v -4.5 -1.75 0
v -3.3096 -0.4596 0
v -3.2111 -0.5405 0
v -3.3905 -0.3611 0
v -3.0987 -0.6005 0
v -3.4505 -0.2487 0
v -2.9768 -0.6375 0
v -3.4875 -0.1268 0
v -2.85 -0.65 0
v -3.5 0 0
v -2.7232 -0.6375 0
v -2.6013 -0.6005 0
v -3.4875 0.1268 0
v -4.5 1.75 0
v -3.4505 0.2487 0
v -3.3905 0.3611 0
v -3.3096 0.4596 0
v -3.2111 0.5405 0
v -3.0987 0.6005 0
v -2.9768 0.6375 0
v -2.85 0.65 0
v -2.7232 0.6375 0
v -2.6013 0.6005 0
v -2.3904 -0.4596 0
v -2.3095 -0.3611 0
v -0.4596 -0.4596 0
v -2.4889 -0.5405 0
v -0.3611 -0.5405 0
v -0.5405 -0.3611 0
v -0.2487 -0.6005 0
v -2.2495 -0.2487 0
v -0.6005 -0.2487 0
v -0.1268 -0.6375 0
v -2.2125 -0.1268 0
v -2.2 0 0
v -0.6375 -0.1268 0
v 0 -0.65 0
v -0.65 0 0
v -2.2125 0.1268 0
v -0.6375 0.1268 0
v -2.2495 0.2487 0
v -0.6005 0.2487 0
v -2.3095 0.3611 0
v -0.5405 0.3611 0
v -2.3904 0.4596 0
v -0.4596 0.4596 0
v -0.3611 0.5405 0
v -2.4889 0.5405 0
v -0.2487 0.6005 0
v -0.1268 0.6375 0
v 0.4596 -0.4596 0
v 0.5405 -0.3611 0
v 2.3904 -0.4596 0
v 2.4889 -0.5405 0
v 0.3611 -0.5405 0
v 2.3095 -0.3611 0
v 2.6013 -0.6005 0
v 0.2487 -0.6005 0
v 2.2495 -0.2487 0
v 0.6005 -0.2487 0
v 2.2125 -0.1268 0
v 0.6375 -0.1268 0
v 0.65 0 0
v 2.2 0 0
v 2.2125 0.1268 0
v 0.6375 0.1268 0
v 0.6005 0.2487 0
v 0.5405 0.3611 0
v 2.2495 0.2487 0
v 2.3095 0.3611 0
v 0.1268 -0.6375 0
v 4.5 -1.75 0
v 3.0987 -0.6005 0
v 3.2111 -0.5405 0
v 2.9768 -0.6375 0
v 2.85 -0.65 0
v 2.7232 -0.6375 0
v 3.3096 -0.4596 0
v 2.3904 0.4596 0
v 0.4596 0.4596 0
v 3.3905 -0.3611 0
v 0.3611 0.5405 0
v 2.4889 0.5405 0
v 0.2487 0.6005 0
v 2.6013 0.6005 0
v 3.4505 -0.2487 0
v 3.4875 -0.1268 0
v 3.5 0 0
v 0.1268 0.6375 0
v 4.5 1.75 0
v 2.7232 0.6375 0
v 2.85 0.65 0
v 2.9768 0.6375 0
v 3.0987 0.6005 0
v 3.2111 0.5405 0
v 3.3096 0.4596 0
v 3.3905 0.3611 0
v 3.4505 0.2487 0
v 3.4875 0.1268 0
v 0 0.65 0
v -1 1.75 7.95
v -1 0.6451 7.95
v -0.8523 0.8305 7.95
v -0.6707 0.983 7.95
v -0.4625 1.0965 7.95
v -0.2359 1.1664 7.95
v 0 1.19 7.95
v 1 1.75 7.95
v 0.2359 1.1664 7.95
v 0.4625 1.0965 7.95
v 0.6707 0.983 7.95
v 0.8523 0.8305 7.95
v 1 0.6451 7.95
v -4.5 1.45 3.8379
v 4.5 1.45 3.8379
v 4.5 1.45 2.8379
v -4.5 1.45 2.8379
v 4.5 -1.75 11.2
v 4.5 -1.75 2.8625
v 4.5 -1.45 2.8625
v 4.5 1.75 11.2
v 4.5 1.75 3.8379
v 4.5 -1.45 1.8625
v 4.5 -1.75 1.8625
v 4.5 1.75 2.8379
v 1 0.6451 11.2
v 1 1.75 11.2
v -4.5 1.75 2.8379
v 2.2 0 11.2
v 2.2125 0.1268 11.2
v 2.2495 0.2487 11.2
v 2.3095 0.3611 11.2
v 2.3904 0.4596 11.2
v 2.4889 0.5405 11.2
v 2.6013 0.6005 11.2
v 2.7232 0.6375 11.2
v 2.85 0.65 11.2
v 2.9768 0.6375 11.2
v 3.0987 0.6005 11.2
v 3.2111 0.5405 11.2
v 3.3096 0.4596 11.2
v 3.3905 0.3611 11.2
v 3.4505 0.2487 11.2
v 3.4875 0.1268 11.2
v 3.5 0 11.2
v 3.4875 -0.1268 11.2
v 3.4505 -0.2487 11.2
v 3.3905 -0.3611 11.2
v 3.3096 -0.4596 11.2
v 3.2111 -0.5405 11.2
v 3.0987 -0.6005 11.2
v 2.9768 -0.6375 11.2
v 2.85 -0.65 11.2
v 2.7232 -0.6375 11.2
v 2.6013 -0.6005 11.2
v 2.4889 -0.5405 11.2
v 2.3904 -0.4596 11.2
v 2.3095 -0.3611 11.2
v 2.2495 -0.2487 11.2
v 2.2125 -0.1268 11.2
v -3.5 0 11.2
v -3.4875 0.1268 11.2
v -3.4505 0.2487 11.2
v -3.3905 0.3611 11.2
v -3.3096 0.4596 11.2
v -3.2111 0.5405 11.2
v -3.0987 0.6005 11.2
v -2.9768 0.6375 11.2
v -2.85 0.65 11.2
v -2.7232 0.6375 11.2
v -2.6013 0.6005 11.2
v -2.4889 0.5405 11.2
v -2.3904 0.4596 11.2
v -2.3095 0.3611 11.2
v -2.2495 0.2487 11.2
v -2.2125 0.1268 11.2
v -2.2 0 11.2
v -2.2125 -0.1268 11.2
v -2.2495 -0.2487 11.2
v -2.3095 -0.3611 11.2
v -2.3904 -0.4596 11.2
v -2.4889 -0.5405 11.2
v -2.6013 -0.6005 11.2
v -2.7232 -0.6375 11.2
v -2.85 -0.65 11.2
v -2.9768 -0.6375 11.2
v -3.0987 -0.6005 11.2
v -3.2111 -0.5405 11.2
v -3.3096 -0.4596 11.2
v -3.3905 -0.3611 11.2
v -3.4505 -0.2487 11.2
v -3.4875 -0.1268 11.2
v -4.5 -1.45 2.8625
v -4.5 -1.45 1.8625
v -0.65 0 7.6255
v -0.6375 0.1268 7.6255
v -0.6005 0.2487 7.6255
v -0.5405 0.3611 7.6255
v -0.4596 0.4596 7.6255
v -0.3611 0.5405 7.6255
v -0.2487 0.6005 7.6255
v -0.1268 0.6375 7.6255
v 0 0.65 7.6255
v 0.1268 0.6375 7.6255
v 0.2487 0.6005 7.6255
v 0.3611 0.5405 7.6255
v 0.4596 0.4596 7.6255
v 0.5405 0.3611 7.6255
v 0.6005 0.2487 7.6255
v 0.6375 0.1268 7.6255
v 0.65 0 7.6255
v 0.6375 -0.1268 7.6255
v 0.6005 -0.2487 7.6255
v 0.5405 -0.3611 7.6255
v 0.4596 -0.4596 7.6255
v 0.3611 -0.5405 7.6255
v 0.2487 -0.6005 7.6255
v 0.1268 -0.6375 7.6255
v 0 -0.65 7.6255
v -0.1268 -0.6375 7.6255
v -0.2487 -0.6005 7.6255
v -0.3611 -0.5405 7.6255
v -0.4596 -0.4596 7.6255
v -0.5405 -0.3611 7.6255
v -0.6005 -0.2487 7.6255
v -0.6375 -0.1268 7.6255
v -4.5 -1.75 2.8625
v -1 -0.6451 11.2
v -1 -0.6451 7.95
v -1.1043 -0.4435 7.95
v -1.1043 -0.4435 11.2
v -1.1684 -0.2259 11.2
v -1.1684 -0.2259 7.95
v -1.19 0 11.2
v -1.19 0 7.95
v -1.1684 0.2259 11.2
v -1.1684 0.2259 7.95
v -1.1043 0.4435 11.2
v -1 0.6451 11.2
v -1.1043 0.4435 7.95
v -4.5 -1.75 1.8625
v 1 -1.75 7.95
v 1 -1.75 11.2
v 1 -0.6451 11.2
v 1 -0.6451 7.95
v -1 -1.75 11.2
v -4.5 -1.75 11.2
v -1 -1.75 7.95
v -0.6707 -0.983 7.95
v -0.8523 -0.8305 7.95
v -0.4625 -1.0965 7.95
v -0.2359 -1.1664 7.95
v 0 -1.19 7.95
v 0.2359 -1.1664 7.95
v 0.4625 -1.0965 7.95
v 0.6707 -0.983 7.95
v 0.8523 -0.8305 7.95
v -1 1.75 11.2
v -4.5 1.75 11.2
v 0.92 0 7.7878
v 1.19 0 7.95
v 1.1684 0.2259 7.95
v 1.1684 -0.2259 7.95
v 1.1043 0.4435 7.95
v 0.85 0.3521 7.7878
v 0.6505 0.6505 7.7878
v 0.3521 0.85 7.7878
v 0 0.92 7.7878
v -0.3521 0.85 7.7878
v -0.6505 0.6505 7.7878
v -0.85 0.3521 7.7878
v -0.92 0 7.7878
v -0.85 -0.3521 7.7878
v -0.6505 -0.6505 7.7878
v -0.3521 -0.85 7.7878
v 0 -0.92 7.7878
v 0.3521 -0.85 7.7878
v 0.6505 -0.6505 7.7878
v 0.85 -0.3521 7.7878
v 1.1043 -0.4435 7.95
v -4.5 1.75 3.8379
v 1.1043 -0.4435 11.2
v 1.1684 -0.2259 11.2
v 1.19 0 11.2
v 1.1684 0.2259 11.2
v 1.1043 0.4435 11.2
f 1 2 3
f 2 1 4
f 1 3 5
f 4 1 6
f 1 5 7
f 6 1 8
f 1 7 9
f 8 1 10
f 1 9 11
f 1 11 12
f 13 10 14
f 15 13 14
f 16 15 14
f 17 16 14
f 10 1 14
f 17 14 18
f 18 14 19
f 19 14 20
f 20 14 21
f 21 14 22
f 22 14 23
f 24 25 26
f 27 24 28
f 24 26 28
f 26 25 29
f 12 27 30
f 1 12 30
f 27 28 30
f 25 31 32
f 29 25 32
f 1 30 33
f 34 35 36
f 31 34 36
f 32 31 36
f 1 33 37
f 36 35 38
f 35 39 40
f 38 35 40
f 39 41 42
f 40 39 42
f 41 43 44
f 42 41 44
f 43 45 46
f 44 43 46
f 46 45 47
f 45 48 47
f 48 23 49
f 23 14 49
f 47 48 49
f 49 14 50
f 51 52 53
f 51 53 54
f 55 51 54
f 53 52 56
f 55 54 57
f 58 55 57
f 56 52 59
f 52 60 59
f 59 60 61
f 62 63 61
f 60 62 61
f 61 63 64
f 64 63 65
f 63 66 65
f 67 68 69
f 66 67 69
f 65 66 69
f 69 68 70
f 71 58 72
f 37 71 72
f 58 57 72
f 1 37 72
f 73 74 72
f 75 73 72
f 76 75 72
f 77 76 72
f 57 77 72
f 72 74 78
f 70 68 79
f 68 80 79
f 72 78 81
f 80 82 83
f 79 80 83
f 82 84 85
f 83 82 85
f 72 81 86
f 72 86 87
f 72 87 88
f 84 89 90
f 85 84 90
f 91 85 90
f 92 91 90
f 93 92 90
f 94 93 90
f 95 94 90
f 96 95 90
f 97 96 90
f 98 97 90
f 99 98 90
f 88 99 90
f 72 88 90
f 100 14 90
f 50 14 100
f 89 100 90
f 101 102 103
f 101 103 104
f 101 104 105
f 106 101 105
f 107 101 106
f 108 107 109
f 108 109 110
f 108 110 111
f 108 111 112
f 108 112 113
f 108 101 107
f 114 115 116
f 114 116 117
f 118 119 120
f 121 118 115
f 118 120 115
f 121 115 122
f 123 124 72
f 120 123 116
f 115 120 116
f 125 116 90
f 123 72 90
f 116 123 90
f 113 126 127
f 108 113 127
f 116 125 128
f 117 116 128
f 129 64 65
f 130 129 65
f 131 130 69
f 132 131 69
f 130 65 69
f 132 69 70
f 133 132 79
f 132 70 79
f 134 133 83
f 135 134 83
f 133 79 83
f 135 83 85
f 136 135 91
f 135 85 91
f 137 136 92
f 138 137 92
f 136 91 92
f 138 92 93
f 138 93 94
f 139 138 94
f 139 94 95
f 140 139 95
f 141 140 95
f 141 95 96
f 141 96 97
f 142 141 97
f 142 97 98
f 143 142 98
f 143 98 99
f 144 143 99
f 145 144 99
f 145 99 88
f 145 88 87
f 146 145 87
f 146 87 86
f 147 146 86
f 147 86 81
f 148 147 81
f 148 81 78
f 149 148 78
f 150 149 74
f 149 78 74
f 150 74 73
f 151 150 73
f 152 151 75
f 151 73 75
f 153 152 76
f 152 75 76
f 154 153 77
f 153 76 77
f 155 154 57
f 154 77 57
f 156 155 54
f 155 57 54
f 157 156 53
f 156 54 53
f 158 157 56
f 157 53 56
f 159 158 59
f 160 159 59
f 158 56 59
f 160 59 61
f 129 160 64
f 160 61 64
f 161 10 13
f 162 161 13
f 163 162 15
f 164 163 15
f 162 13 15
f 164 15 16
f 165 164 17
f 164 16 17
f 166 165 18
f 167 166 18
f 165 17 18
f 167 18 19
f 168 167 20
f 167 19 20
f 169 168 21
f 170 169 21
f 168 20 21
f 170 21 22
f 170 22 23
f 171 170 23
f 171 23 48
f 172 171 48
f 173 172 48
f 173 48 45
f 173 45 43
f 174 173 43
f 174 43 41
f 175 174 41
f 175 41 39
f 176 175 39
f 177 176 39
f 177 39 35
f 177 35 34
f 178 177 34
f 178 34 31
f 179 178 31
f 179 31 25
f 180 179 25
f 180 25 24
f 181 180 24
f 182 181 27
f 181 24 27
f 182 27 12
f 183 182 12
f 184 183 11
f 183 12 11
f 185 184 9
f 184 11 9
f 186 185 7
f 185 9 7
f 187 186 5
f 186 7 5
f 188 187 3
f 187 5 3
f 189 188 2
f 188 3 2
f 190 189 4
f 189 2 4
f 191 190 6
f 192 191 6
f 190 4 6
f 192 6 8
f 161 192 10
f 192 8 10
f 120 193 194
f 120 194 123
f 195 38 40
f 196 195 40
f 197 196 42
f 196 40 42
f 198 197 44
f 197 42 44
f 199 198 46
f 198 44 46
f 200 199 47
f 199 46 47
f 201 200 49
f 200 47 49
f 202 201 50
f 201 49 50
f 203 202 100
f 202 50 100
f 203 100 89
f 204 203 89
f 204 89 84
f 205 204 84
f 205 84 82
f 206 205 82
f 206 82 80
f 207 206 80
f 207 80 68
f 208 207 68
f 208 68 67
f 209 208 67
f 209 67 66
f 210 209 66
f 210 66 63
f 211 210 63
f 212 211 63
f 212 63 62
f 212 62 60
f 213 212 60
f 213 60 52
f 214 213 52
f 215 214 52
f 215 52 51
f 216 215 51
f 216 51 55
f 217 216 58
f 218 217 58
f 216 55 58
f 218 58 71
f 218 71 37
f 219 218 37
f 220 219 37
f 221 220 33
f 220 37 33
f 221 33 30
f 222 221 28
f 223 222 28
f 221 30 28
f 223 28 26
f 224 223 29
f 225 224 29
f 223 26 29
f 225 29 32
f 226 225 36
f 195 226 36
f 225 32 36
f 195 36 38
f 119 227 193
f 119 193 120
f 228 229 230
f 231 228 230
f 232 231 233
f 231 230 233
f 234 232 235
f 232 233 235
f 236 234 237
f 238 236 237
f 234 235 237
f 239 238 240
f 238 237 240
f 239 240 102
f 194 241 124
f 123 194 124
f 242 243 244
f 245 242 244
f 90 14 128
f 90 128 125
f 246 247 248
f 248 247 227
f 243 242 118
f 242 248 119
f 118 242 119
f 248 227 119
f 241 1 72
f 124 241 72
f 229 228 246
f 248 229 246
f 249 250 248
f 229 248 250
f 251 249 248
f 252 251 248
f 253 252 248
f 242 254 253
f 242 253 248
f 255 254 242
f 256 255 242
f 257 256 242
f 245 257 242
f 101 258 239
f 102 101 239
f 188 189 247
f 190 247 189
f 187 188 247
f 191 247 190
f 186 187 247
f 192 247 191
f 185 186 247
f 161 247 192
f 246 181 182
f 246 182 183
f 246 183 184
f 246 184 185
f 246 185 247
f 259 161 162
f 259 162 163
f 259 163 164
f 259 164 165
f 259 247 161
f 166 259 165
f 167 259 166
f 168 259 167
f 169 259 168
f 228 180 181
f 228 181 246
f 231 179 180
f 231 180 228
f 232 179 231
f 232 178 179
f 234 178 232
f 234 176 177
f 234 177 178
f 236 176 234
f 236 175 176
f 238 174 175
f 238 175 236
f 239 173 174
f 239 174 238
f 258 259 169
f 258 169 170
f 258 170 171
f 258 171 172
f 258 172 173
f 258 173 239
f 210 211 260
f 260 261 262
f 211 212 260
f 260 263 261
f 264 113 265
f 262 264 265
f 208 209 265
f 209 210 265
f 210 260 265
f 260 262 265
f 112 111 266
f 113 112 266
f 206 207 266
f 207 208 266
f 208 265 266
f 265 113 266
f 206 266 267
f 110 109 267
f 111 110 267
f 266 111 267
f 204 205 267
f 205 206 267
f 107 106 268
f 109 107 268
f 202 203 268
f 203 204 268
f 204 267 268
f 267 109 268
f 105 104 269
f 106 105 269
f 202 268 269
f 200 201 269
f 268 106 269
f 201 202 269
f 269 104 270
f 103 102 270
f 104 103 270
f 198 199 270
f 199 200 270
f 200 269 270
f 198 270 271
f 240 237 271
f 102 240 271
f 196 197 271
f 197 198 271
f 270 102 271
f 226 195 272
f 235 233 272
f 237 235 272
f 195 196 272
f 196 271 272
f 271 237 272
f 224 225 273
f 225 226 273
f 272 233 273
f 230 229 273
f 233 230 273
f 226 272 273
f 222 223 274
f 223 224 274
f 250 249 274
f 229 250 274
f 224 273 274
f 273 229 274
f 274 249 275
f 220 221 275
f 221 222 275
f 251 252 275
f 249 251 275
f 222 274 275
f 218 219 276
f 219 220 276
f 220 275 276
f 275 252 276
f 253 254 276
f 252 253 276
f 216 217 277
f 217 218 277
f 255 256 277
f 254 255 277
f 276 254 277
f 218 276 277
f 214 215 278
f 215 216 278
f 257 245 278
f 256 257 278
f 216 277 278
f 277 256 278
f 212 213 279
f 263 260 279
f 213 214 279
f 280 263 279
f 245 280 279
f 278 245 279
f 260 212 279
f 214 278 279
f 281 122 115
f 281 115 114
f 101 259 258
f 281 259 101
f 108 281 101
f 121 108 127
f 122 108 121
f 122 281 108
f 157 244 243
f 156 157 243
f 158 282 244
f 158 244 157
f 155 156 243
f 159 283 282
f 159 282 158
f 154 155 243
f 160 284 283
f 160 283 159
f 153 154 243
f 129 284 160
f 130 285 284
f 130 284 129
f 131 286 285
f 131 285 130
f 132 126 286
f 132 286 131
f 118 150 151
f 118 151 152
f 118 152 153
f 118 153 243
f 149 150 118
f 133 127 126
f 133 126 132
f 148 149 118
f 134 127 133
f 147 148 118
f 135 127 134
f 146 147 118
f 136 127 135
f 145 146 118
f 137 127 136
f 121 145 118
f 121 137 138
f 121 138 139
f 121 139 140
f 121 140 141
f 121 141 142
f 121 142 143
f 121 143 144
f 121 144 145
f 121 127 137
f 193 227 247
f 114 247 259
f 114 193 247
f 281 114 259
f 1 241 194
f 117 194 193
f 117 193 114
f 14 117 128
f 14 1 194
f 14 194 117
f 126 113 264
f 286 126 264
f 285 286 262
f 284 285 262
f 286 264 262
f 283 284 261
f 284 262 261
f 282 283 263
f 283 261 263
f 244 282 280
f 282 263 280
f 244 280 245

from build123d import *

# Parameters (mm, degrees)
F0_W      = 9
F0_H      = 3.5
F1_DEPTH  = 11.2
F3_D      = 2.38
F3_DEPTH  = 3.25
F3_TIP    = 0.7150241366
F5_D      = 1.3
F6_W      = 9
F6_H      = 1
F7_DEPTH  = 0.3
F9_DEPTH  = 3.25
F10_W     = 9
F10_H     = 1
F11_DEPTH = 0.3


with BuildPart() as f1:
    # F0 (on Top) → F1 (new body)
    with BuildSketch(Plane.XY):
        Rectangle(F0_W, F0_H)
    extrude(amount=F1_DEPTH)

    # F3
    with Locations(Plane.XY.offset(11.2)):
        with Locations((0, 0)):
            Hole(F3_D / 2, depth=F3_DEPTH)
            with Locations((0, 0, -(F3_DEPTH + F3_TIP / 2))):  # 118° drill point
                Cone(0, F3_D / 2, F3_TIP, mode=Mode.SUBTRACT)

    # F5 (through all)
    with Locations(Plane.XY.offset(11.2)):
        with Locations((0, 0), (-2.85, 0), (2.85, 0)):
            Hole(F5_D / 2)

    # F6 (on face) → F7 (cut)
    with BuildSketch(Plane.XZ.offset(1.75)):
        with Locations((0, 2.3625027388)):
            Rectangle(F6_W, F6_H)
    extrude(amount=-F7_DEPTH, mode=Mode.SUBTRACT)

    # F8 (on face) → F9 (cut)
    with BuildSketch(Plane.XY.offset(11.2)):
        with BuildLine():
            Line((-1, -1.75), (1, -1.75))
            Line((1, -1.75), (1, -0.6450581369))
            ThreePointArc((1, -0.6450581369), (0, -1.19), (-1, -0.6450581369))
            Line((-1, -0.6450581369), (-1, -1.75))
        make_face()
        with BuildLine():
            ThreePointArc((-1, 0.6450581369), (0, 1.19), (1, 0.6450581369))
            Line((1, 0.6450581369), (1, 1.75))
            Line((1, 1.75), (-1, 1.75))
            Line((-1, 1.75), (-1, 0.6450581369))
        make_face()
    extrude(amount=-F9_DEPTH, mode=Mode.SUBTRACT)

    # F10 (on face) → F11 (cut)
    with BuildSketch(Plane(origin=(0, 1.75, 0), x_dir=(-1, 0, 0), z_dir=(0, 1, 0))):
        with Locations((0, 3.3379399683)):
            Rectangle(F10_W, F10_H)
    extrude(amount=-F11_DEPTH, mode=Mode.SUBTRACT)


solid = f1.part
